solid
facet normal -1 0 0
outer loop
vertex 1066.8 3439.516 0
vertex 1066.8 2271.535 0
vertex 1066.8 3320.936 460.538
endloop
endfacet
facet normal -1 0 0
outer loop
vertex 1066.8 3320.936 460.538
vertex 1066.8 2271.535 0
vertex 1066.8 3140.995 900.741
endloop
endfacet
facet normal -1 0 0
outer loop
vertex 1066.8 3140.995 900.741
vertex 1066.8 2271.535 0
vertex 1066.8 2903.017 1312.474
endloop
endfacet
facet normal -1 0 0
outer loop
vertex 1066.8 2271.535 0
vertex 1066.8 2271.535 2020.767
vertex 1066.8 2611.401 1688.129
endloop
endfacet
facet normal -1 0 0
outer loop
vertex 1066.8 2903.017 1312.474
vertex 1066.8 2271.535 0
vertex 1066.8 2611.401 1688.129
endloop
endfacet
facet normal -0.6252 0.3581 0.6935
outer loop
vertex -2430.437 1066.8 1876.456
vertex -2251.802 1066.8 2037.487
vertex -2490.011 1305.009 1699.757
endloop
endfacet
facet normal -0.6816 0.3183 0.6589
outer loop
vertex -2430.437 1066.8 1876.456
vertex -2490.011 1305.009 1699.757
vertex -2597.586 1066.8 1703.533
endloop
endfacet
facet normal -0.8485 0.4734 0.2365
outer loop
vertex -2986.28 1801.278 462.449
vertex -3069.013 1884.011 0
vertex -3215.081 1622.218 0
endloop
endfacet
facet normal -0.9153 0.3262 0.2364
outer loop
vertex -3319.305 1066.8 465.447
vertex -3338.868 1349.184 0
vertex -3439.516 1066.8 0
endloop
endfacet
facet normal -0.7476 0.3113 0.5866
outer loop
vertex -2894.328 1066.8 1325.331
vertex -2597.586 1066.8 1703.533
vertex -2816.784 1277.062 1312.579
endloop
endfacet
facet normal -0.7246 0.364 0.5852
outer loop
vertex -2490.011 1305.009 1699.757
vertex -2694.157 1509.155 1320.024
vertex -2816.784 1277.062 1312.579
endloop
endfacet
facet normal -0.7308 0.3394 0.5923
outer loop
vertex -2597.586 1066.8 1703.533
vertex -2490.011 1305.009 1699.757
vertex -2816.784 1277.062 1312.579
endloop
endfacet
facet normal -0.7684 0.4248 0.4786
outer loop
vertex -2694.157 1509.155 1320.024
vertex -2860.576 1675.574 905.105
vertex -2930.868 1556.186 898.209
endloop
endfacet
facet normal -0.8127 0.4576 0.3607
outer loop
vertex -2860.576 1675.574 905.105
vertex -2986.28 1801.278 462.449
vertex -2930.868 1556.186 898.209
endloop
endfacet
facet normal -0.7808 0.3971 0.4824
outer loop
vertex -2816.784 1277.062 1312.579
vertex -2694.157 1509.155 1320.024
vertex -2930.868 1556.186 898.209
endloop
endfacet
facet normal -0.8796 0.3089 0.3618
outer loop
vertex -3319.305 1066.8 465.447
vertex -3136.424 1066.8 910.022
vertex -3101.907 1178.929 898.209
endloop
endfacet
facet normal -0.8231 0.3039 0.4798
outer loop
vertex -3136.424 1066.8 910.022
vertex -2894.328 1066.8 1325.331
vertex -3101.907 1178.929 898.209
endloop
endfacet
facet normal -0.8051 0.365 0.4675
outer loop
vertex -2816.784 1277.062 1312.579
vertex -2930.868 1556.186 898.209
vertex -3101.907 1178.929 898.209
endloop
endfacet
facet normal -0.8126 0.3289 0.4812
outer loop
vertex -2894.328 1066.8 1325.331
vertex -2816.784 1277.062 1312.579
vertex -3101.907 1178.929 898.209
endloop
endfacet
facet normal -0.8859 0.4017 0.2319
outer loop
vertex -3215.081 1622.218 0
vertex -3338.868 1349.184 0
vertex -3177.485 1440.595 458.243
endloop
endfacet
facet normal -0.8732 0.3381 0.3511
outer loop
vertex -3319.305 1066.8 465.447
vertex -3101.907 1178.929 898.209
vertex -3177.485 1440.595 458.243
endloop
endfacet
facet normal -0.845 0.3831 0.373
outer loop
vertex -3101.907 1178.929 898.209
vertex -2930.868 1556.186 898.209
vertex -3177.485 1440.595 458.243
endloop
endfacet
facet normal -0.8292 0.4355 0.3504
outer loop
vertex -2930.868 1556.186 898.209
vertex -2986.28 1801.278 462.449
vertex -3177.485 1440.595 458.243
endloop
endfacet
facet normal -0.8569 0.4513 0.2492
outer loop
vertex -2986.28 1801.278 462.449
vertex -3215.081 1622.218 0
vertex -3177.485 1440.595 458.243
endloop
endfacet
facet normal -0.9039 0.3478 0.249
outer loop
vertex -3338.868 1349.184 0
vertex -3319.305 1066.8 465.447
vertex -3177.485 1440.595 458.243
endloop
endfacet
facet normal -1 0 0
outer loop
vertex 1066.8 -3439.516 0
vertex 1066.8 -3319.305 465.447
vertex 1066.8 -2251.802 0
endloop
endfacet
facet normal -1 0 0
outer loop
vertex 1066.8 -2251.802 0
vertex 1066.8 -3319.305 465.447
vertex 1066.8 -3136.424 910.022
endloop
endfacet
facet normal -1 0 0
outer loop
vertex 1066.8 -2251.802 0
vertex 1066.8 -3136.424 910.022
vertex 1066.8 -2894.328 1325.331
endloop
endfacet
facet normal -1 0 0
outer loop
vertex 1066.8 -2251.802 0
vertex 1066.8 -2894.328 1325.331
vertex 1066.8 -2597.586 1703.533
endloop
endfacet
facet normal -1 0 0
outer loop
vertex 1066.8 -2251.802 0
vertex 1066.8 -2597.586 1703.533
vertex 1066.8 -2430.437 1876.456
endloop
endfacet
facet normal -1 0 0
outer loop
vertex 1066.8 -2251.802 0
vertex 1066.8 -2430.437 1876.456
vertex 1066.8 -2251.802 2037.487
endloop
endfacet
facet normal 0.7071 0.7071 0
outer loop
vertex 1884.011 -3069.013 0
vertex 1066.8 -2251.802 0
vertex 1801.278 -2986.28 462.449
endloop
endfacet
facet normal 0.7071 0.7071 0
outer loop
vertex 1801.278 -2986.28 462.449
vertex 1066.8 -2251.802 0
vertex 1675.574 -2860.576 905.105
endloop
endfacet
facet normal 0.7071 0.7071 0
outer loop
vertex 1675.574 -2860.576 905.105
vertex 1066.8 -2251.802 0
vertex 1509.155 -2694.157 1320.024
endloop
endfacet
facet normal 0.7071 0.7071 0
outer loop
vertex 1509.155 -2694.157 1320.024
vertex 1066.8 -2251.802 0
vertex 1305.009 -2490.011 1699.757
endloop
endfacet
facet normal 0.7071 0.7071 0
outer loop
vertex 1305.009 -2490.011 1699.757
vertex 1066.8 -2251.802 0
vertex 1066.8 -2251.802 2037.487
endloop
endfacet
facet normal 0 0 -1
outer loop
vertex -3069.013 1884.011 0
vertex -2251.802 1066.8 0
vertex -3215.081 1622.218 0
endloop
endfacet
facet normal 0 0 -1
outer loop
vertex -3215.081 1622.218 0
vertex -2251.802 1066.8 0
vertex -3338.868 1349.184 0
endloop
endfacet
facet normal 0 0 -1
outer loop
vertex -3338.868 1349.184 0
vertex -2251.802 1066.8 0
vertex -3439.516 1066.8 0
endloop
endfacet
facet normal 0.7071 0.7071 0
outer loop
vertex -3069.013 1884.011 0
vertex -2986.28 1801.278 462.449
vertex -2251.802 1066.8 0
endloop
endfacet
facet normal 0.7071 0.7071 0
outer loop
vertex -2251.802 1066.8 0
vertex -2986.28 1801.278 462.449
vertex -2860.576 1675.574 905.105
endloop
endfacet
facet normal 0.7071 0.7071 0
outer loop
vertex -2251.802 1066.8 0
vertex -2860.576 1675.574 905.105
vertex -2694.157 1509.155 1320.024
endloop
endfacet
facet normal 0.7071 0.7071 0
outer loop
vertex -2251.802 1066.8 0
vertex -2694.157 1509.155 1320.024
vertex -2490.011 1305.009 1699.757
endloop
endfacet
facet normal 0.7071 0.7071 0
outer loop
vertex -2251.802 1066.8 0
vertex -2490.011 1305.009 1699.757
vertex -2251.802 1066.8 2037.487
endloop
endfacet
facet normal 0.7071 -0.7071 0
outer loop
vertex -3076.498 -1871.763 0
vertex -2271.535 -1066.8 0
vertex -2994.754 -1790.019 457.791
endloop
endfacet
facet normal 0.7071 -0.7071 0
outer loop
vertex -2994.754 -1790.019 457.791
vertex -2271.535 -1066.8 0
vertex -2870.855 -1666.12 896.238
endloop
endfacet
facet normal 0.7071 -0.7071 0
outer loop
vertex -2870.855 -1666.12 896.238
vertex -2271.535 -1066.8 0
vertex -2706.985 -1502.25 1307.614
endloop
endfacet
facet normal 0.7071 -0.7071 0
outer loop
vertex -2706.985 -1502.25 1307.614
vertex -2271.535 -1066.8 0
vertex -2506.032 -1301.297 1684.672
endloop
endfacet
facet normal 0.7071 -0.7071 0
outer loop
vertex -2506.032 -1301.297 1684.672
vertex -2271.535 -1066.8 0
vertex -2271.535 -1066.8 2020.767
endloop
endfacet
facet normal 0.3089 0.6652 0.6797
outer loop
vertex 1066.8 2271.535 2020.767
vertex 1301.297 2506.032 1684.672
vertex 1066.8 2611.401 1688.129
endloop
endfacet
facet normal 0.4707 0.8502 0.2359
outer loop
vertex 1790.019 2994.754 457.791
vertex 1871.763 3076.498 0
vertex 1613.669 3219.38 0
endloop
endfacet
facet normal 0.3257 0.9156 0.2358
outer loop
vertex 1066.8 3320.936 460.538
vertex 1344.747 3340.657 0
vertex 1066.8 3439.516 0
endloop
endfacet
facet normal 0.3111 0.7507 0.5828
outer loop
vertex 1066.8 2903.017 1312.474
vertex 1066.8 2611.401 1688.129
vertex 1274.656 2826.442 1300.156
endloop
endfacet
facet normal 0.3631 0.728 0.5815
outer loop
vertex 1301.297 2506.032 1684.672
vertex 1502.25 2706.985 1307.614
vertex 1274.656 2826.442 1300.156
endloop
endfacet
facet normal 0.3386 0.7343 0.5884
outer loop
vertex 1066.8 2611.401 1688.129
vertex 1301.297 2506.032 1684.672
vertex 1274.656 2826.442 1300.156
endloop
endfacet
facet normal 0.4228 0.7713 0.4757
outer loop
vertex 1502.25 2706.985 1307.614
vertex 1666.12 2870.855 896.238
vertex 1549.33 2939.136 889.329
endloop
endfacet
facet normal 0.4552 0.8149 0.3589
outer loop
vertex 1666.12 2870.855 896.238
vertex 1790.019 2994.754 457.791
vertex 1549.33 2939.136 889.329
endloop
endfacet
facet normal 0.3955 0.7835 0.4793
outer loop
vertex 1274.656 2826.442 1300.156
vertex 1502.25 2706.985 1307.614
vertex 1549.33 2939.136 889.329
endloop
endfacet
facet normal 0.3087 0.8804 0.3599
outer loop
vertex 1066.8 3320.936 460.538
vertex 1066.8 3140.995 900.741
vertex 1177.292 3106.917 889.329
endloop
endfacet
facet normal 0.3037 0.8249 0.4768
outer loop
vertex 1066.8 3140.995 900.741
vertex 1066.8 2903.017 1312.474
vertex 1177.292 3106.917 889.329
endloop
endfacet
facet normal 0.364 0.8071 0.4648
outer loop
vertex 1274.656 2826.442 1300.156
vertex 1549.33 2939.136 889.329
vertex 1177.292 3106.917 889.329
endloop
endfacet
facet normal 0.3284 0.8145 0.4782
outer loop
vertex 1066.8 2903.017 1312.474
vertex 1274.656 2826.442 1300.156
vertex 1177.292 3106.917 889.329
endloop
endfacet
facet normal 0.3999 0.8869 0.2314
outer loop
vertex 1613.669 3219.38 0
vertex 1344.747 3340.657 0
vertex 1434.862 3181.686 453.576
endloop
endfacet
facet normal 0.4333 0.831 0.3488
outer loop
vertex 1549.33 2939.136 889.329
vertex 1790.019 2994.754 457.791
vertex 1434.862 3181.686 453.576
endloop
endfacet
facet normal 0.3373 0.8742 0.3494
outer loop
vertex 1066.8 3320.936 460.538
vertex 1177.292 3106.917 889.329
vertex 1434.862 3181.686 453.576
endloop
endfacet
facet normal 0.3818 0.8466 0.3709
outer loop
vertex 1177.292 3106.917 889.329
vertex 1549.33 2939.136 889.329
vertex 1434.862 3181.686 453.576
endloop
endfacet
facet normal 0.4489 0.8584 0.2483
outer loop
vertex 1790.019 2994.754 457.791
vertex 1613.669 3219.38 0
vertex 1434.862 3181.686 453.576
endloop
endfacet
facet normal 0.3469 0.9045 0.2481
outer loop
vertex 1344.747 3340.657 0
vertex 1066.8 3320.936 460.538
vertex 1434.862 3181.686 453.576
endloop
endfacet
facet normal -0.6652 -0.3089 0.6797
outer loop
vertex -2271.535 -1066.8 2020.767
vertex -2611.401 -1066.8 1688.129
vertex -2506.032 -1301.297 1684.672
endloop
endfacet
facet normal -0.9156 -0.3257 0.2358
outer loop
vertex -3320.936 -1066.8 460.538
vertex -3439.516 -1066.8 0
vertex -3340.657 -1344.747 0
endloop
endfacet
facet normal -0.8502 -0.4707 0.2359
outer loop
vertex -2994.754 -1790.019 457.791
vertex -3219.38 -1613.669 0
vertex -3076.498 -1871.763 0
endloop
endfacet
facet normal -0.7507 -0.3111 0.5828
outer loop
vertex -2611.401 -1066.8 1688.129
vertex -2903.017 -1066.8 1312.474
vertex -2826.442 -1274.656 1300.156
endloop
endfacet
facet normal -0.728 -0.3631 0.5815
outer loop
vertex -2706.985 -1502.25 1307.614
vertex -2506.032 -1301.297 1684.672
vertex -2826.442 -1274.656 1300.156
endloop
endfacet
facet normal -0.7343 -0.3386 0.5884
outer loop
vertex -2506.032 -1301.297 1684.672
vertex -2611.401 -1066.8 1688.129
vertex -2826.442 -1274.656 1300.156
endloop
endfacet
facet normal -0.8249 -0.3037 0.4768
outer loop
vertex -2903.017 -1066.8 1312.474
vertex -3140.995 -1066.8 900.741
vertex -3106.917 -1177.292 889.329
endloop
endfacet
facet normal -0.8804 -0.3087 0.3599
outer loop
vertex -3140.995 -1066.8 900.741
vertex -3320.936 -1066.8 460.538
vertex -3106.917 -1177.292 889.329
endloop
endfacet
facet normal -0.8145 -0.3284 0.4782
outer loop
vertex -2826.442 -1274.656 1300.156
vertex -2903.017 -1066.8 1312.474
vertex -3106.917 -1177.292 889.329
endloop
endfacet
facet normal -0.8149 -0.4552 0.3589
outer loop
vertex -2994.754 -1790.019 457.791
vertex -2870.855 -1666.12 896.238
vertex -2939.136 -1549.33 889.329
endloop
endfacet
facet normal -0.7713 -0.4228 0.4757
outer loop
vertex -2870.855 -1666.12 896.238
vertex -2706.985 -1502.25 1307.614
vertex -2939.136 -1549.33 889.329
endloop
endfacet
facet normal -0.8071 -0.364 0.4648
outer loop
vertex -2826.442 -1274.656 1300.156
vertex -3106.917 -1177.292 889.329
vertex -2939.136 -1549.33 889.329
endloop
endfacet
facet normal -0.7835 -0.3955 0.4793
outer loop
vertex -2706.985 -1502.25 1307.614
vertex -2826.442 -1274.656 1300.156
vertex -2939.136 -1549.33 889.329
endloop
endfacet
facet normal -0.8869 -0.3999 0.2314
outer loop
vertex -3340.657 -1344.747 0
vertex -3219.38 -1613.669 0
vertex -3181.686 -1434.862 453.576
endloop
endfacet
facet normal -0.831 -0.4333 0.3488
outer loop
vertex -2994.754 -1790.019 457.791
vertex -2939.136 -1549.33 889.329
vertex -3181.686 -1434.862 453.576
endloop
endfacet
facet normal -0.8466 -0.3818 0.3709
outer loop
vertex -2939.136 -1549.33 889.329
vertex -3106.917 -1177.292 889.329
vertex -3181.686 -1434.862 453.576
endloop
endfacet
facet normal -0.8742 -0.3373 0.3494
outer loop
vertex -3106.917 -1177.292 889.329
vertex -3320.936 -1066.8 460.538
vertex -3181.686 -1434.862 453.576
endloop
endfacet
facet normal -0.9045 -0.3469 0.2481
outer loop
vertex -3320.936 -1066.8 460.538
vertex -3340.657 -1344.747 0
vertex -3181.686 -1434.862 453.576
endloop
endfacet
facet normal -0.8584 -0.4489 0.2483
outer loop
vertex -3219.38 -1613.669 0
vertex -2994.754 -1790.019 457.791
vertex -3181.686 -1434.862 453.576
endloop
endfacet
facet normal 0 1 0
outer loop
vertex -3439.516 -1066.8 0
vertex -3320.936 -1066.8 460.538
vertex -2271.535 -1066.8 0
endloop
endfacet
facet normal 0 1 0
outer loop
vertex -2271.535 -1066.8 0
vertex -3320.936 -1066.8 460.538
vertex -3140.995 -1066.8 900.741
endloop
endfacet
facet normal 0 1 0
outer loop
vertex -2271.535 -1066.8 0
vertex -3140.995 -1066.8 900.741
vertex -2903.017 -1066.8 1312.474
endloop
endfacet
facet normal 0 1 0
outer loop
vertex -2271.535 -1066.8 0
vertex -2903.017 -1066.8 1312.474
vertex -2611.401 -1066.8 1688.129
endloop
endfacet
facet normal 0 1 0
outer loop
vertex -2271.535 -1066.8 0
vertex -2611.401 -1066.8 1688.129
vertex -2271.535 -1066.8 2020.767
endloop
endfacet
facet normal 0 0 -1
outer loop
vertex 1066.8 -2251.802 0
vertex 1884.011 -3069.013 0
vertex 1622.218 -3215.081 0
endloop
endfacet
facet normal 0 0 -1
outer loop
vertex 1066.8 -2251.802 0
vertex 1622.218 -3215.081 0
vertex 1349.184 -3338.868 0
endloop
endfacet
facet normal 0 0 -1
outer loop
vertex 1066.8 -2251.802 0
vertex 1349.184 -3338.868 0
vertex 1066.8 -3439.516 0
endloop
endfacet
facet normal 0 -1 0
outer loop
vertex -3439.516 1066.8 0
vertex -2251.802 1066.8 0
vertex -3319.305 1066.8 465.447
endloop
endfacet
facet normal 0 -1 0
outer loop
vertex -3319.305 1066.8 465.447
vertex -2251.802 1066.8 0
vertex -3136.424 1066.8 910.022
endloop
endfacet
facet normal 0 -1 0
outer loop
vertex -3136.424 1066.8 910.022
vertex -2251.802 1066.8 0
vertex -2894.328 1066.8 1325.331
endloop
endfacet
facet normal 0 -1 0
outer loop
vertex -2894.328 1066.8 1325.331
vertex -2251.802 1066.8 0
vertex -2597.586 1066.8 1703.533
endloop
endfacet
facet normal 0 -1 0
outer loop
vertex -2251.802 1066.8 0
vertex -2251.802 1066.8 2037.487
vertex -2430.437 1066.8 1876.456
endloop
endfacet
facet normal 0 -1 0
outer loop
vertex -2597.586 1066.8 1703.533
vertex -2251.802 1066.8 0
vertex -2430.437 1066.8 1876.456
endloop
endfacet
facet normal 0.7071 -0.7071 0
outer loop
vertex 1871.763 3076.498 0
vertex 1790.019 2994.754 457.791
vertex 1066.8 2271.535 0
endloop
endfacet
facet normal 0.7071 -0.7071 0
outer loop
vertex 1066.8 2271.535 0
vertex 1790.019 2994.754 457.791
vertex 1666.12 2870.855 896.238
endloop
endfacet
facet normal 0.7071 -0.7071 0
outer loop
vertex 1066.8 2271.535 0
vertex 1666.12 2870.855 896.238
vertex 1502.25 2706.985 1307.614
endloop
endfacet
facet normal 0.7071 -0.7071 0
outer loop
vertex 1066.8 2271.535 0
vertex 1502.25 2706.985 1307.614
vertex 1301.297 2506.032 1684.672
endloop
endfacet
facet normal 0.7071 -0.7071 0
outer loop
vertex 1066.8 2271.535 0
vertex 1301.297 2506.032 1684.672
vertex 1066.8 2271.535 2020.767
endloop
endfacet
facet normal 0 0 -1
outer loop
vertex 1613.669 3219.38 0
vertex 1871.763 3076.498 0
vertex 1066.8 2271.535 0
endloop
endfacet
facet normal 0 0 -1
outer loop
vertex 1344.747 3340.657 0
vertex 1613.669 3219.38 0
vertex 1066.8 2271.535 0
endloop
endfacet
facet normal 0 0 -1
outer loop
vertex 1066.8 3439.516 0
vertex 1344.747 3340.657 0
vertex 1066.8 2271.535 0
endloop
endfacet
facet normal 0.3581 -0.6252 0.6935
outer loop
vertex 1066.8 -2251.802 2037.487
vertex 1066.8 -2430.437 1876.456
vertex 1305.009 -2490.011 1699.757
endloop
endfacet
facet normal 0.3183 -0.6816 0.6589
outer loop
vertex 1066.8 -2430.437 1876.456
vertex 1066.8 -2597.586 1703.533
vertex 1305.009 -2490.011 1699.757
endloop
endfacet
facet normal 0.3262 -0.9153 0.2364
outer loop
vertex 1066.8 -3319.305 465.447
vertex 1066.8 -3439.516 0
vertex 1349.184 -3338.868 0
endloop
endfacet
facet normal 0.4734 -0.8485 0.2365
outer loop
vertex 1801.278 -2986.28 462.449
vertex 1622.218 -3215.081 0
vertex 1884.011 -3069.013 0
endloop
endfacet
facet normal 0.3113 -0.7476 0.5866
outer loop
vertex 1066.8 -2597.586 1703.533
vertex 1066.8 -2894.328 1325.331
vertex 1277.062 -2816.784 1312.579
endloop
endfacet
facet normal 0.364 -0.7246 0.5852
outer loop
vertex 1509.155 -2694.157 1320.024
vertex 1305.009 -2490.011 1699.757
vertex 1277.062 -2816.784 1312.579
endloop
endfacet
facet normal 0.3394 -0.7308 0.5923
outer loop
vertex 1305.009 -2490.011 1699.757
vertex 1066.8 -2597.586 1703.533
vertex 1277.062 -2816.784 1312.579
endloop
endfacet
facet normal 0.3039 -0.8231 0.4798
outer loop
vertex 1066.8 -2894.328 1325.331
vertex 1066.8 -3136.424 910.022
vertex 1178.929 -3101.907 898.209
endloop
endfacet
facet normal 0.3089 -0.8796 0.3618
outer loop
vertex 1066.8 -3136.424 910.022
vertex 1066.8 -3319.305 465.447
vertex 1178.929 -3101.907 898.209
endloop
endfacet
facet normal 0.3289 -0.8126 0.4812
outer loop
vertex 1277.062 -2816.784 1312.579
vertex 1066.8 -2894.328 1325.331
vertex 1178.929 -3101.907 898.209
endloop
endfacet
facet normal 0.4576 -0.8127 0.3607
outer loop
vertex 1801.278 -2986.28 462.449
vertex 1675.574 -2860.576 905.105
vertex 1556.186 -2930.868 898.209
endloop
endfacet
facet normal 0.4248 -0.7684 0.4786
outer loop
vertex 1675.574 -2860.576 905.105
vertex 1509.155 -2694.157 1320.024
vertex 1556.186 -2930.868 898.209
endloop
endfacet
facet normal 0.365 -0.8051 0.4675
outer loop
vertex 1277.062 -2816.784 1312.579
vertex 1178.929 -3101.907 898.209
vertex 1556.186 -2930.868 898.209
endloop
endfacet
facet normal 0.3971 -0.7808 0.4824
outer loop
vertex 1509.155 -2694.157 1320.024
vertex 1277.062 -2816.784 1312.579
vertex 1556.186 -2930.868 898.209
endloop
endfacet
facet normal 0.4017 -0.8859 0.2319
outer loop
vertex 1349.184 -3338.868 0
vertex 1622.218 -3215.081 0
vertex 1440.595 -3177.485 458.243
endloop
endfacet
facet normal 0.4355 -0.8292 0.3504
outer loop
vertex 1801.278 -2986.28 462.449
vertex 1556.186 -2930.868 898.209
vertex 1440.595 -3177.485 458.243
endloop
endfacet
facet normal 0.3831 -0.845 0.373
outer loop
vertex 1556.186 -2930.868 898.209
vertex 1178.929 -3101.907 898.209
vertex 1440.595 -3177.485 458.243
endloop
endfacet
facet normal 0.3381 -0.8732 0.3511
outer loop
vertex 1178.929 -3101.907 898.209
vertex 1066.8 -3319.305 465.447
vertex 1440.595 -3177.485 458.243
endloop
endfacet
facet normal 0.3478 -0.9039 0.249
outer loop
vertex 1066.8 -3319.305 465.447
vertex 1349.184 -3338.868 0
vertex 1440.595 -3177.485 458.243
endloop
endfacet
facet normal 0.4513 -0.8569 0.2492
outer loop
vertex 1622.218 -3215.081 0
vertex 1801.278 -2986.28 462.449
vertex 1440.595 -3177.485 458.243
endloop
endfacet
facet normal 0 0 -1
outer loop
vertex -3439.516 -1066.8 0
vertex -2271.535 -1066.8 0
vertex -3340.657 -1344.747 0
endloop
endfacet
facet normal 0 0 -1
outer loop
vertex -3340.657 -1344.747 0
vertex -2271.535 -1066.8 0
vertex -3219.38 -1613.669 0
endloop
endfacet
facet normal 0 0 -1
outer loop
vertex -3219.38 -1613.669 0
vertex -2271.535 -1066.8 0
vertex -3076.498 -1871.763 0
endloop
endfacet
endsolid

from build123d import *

# Parameters (mm, degrees)
F4_DEPTH = 3048.001
F7_DEPTH = 3048.001


with BuildPart() as f1:
    # F0 (on Front) → F1 (revolve)
    with BuildSketch(Plane.XZ):
        with BuildLine():
            Line((-3601.157502, 0), (0, 0))
            Line((0, 0), (0, 3017.52))
            ThreePointArc((0, 3017.52), (-2349.136134, 2163.417313), (-3601.157502, 0))
        make_face()
    revolve(axis=Axis((0, 0, 1508.76), (0, 0, 1)))

    # F3 (on offset) → F4 (cut, through all)
    with BuildSketch(Plane.XY.offset(3048)):
        Polygon((1066.8, -1066.8), (5574.511623, -1066.8), (5574.511623, 1066.8), (1066.8, 1066.8), (1066.8, 4918.191671), (-1066.8, 4918.191671), (-1066.8, 1066.8), (-5574.511623, 1066.8), (-5574.511623, -1066.8), (-1066.8, -1066.8), (-1066.8, -4918.191671), (1066.8, -4918.191671), align=None)
    extrude(amount=-F4_DEPTH, mode=Mode.SUBTRACT)

    # F6 (on offset) → F7 (cut, through all)
    with BuildSketch(Plane.XY.offset(3048)):
        Polygon((3254.531535, -4439.533621), (5050.582759, -2643.482397), (2397.233965, 9.866397), (5584.974607, 3197.607039), (3788.923382, 4993.658263), (601.182741, 1805.917621), (-2103.190639, 4510.291001), (-3899.241863, 2714.239776), (-1194.868484, 9.866397), (-4624.669167, -3419.934287), (-2768.824077, -5156.191644), (601.182741, -1786.184827), align=None)
    extrude(amount=-F7_DEPTH, mode=Mode.SUBTRACT)


solid = f1.part
